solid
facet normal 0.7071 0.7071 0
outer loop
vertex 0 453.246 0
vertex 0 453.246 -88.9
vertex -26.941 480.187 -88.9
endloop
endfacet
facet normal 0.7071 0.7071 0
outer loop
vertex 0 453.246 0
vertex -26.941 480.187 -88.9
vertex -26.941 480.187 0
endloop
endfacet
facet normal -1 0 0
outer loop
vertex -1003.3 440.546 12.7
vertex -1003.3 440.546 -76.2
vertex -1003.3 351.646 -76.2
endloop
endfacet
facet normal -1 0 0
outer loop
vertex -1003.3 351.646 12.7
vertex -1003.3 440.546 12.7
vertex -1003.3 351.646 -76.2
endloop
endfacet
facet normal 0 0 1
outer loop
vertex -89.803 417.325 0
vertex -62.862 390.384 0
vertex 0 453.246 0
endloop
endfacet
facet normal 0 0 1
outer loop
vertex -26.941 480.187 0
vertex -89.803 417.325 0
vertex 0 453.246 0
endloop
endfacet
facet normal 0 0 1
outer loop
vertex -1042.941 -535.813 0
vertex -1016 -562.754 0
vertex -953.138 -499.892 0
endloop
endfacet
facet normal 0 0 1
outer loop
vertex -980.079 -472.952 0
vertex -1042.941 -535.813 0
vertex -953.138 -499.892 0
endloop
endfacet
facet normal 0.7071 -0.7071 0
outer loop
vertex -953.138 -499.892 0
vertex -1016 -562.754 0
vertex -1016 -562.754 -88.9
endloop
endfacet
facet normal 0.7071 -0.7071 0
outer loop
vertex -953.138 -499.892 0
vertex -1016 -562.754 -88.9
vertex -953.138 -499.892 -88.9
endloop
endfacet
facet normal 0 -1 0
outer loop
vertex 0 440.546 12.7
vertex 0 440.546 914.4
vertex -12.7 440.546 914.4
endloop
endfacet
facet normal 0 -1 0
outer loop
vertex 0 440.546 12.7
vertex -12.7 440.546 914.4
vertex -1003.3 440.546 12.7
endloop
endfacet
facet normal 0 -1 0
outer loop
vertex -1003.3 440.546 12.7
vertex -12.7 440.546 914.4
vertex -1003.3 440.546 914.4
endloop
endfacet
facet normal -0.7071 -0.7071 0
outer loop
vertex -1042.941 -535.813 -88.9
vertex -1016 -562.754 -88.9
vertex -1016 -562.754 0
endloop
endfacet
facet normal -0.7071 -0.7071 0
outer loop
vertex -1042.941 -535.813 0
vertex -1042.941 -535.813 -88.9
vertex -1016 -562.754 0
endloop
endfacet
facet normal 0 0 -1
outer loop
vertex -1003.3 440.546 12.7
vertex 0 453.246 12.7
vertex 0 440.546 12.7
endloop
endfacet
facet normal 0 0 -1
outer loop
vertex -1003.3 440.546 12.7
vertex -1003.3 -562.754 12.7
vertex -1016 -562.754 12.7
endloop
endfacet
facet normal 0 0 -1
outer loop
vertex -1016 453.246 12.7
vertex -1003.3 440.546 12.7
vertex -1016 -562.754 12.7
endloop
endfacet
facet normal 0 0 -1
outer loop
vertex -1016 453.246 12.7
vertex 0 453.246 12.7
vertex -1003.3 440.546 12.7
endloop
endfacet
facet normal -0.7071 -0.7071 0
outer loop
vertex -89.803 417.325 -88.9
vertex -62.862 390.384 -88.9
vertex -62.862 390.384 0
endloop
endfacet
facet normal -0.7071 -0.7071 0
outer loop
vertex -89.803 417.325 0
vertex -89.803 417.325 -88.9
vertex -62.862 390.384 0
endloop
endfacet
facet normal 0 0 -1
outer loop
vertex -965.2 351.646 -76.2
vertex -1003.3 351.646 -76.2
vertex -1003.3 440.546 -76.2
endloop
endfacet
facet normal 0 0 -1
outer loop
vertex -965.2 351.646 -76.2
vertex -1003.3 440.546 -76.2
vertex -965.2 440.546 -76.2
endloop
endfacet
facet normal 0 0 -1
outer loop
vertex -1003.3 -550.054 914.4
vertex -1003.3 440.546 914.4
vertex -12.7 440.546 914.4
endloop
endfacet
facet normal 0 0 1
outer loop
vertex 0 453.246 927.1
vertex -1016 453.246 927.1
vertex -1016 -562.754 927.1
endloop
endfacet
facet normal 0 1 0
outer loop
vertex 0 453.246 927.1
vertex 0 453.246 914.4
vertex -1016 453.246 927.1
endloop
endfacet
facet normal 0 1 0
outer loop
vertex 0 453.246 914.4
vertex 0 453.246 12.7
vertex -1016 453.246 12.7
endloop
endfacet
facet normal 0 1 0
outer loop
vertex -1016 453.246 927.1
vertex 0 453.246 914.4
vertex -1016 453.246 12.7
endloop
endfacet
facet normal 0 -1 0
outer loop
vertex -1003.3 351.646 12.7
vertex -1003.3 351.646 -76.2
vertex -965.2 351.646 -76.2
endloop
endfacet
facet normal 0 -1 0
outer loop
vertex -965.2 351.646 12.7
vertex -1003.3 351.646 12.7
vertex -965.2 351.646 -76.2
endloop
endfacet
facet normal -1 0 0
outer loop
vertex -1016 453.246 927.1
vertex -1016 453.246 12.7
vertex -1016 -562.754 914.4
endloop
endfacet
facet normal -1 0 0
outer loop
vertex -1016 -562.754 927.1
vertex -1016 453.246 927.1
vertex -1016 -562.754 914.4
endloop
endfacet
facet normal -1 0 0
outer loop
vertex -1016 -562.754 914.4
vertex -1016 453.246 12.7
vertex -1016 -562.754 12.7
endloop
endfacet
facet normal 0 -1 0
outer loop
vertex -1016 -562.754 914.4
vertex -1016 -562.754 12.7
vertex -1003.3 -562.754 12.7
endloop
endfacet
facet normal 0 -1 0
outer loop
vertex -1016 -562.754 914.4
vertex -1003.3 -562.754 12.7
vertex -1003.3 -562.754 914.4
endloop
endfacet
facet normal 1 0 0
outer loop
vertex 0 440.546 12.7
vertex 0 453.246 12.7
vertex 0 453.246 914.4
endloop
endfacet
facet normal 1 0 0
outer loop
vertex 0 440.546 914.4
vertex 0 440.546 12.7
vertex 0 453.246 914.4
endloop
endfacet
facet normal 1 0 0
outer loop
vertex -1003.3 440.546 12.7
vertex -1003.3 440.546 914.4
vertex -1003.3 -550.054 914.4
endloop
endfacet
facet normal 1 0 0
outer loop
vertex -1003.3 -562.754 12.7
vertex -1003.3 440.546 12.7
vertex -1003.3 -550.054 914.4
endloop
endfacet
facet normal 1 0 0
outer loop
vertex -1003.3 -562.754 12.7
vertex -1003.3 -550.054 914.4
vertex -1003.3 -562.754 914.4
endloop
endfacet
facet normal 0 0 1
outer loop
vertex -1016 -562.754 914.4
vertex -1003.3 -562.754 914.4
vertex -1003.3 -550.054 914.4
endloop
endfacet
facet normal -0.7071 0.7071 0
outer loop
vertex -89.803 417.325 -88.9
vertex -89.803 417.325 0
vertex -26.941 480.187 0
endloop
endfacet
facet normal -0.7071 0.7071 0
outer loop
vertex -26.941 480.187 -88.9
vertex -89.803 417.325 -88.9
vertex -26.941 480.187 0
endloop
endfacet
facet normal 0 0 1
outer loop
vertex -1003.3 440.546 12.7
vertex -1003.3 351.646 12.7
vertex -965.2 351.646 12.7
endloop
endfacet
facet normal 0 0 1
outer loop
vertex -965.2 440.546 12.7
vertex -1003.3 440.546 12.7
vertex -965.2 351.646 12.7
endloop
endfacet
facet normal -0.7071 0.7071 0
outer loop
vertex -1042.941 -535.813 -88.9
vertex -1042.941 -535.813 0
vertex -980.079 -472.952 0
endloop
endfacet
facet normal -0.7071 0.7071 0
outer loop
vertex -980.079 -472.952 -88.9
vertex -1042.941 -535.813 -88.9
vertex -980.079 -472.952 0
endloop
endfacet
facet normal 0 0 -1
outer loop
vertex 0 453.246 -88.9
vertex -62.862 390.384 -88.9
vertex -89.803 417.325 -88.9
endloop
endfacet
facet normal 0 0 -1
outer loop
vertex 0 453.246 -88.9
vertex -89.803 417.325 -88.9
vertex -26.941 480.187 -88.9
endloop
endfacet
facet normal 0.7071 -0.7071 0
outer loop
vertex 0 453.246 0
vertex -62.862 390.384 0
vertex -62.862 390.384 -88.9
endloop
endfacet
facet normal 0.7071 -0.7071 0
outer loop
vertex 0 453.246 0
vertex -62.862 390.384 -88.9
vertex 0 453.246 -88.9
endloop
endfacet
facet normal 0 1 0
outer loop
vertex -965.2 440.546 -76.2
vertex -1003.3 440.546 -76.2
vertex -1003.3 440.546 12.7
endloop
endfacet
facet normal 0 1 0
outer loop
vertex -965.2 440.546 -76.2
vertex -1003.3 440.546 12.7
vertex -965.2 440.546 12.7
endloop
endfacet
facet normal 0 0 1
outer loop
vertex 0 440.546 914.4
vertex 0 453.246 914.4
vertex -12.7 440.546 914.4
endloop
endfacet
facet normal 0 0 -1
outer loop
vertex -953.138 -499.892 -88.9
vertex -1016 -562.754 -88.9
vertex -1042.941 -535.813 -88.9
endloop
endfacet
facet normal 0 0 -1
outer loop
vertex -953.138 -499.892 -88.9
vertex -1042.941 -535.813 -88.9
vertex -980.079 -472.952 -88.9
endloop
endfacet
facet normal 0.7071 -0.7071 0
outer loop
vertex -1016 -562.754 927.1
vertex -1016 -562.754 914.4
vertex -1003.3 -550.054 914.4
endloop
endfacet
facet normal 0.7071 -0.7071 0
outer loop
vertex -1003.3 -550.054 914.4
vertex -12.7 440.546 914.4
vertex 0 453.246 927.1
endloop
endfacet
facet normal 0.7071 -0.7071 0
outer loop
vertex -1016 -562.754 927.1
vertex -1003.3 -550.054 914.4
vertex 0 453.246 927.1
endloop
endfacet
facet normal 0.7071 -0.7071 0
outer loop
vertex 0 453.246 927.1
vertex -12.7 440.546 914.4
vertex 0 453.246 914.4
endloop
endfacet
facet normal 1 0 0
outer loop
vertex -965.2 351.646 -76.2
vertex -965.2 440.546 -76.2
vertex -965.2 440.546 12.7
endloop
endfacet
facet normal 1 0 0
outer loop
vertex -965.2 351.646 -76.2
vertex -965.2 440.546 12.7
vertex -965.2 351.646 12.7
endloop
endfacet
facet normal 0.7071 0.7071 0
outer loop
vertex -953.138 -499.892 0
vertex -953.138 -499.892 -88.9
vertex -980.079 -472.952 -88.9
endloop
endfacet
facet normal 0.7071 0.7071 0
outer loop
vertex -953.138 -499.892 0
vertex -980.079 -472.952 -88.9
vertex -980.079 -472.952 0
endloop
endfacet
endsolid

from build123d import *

# Parameters (mm, degrees)
F2_W      = 1016
F2_H      = 901.7
F3_DEPTH  = 12.7
F4_W      = 1016
F4_H      = 901.7
F5_DEPTH  = 12.7
F6_W      = 88.9
F6_H      = 88.9
F7_DEPTH  = 38.1
F8_W      = 38.1
F8_H      = 88.9
F9_DEPTH  = 88.9
F11_DEPTH = 12.7


with BuildPart() as f3:
    # F2 (on face) → F3 (new body)
    with BuildSketch(Plane(origin=(0, 453.2457475339, 0), x_dir=(-1, 0, 0), z_dir=(0, 1, 0))):
        with Locations((508, 463.55)):
            Rectangle(F2_W, F2_H)
    extrude(amount=-F3_DEPTH)

    # F4 (on face) → F5 (join)
    with BuildSketch(Plane(origin=(-1016, 0, 0), x_dir=(0, -1, 0), z_dir=(-1, 0, 0))):
        with Locations((54.7542524661, 463.55)):
            Rectangle(F4_W, F4_H)
    extrude(amount=-F5_DEPTH)

    # F10 (on face) → F11 (join)
    with BuildSketch(Plane.XY.offset(914.4)):
        Polygon((-1016, 453.2457475339), (-1016, -562.7542524661), (0, 453.2457475339), align=None)
    extrude(amount=F11_DEPTH)


with BuildPart() as f7:
    # F6 (on face) → F7 (new body)
    with BuildSketch(Plane(origin=(-226.6228737669, 226.6228737669, 0), x_dir=(0.7071067812, 0.7071067812, 0), z_dir=(0.7071067812, -0.7071067812, 0))):
        with Locations((-1071.8978377459, -44.45)):
            Rectangle(F6_W, F6_H)
    extrude(amount=-F7_DEPTH)


with BuildPart() as f7b:
    # F6 (on face) → F7, piece 2 (new body)
    with BuildSketch(Plane(origin=(-226.6228737669, 226.6228737669, 0), x_dir=(0.7071067812, 0.7071067812, 0), z_dir=(0.7071067812, -0.7071067812, 0))):
        with Locations((276.0431416252, -44.45)):
            Rectangle(F6_W, F6_H)
    extrude(amount=-F7_DEPTH)


with BuildPart() as f9:
    # F8 (on face) → F9 (new body)
    with BuildSketch(Plane(origin=(0, 0, 12.7), x_dir=(1, 0, 0), z_dir=(0, 0, -1))):
        with Locations((-984.25, -396.0957475339)):
            Rectangle(F8_W, F8_H)
    extrude(amount=F9_DEPTH)


solid = Compound([f3.part, f7.part, f7b.part, f9.part])
